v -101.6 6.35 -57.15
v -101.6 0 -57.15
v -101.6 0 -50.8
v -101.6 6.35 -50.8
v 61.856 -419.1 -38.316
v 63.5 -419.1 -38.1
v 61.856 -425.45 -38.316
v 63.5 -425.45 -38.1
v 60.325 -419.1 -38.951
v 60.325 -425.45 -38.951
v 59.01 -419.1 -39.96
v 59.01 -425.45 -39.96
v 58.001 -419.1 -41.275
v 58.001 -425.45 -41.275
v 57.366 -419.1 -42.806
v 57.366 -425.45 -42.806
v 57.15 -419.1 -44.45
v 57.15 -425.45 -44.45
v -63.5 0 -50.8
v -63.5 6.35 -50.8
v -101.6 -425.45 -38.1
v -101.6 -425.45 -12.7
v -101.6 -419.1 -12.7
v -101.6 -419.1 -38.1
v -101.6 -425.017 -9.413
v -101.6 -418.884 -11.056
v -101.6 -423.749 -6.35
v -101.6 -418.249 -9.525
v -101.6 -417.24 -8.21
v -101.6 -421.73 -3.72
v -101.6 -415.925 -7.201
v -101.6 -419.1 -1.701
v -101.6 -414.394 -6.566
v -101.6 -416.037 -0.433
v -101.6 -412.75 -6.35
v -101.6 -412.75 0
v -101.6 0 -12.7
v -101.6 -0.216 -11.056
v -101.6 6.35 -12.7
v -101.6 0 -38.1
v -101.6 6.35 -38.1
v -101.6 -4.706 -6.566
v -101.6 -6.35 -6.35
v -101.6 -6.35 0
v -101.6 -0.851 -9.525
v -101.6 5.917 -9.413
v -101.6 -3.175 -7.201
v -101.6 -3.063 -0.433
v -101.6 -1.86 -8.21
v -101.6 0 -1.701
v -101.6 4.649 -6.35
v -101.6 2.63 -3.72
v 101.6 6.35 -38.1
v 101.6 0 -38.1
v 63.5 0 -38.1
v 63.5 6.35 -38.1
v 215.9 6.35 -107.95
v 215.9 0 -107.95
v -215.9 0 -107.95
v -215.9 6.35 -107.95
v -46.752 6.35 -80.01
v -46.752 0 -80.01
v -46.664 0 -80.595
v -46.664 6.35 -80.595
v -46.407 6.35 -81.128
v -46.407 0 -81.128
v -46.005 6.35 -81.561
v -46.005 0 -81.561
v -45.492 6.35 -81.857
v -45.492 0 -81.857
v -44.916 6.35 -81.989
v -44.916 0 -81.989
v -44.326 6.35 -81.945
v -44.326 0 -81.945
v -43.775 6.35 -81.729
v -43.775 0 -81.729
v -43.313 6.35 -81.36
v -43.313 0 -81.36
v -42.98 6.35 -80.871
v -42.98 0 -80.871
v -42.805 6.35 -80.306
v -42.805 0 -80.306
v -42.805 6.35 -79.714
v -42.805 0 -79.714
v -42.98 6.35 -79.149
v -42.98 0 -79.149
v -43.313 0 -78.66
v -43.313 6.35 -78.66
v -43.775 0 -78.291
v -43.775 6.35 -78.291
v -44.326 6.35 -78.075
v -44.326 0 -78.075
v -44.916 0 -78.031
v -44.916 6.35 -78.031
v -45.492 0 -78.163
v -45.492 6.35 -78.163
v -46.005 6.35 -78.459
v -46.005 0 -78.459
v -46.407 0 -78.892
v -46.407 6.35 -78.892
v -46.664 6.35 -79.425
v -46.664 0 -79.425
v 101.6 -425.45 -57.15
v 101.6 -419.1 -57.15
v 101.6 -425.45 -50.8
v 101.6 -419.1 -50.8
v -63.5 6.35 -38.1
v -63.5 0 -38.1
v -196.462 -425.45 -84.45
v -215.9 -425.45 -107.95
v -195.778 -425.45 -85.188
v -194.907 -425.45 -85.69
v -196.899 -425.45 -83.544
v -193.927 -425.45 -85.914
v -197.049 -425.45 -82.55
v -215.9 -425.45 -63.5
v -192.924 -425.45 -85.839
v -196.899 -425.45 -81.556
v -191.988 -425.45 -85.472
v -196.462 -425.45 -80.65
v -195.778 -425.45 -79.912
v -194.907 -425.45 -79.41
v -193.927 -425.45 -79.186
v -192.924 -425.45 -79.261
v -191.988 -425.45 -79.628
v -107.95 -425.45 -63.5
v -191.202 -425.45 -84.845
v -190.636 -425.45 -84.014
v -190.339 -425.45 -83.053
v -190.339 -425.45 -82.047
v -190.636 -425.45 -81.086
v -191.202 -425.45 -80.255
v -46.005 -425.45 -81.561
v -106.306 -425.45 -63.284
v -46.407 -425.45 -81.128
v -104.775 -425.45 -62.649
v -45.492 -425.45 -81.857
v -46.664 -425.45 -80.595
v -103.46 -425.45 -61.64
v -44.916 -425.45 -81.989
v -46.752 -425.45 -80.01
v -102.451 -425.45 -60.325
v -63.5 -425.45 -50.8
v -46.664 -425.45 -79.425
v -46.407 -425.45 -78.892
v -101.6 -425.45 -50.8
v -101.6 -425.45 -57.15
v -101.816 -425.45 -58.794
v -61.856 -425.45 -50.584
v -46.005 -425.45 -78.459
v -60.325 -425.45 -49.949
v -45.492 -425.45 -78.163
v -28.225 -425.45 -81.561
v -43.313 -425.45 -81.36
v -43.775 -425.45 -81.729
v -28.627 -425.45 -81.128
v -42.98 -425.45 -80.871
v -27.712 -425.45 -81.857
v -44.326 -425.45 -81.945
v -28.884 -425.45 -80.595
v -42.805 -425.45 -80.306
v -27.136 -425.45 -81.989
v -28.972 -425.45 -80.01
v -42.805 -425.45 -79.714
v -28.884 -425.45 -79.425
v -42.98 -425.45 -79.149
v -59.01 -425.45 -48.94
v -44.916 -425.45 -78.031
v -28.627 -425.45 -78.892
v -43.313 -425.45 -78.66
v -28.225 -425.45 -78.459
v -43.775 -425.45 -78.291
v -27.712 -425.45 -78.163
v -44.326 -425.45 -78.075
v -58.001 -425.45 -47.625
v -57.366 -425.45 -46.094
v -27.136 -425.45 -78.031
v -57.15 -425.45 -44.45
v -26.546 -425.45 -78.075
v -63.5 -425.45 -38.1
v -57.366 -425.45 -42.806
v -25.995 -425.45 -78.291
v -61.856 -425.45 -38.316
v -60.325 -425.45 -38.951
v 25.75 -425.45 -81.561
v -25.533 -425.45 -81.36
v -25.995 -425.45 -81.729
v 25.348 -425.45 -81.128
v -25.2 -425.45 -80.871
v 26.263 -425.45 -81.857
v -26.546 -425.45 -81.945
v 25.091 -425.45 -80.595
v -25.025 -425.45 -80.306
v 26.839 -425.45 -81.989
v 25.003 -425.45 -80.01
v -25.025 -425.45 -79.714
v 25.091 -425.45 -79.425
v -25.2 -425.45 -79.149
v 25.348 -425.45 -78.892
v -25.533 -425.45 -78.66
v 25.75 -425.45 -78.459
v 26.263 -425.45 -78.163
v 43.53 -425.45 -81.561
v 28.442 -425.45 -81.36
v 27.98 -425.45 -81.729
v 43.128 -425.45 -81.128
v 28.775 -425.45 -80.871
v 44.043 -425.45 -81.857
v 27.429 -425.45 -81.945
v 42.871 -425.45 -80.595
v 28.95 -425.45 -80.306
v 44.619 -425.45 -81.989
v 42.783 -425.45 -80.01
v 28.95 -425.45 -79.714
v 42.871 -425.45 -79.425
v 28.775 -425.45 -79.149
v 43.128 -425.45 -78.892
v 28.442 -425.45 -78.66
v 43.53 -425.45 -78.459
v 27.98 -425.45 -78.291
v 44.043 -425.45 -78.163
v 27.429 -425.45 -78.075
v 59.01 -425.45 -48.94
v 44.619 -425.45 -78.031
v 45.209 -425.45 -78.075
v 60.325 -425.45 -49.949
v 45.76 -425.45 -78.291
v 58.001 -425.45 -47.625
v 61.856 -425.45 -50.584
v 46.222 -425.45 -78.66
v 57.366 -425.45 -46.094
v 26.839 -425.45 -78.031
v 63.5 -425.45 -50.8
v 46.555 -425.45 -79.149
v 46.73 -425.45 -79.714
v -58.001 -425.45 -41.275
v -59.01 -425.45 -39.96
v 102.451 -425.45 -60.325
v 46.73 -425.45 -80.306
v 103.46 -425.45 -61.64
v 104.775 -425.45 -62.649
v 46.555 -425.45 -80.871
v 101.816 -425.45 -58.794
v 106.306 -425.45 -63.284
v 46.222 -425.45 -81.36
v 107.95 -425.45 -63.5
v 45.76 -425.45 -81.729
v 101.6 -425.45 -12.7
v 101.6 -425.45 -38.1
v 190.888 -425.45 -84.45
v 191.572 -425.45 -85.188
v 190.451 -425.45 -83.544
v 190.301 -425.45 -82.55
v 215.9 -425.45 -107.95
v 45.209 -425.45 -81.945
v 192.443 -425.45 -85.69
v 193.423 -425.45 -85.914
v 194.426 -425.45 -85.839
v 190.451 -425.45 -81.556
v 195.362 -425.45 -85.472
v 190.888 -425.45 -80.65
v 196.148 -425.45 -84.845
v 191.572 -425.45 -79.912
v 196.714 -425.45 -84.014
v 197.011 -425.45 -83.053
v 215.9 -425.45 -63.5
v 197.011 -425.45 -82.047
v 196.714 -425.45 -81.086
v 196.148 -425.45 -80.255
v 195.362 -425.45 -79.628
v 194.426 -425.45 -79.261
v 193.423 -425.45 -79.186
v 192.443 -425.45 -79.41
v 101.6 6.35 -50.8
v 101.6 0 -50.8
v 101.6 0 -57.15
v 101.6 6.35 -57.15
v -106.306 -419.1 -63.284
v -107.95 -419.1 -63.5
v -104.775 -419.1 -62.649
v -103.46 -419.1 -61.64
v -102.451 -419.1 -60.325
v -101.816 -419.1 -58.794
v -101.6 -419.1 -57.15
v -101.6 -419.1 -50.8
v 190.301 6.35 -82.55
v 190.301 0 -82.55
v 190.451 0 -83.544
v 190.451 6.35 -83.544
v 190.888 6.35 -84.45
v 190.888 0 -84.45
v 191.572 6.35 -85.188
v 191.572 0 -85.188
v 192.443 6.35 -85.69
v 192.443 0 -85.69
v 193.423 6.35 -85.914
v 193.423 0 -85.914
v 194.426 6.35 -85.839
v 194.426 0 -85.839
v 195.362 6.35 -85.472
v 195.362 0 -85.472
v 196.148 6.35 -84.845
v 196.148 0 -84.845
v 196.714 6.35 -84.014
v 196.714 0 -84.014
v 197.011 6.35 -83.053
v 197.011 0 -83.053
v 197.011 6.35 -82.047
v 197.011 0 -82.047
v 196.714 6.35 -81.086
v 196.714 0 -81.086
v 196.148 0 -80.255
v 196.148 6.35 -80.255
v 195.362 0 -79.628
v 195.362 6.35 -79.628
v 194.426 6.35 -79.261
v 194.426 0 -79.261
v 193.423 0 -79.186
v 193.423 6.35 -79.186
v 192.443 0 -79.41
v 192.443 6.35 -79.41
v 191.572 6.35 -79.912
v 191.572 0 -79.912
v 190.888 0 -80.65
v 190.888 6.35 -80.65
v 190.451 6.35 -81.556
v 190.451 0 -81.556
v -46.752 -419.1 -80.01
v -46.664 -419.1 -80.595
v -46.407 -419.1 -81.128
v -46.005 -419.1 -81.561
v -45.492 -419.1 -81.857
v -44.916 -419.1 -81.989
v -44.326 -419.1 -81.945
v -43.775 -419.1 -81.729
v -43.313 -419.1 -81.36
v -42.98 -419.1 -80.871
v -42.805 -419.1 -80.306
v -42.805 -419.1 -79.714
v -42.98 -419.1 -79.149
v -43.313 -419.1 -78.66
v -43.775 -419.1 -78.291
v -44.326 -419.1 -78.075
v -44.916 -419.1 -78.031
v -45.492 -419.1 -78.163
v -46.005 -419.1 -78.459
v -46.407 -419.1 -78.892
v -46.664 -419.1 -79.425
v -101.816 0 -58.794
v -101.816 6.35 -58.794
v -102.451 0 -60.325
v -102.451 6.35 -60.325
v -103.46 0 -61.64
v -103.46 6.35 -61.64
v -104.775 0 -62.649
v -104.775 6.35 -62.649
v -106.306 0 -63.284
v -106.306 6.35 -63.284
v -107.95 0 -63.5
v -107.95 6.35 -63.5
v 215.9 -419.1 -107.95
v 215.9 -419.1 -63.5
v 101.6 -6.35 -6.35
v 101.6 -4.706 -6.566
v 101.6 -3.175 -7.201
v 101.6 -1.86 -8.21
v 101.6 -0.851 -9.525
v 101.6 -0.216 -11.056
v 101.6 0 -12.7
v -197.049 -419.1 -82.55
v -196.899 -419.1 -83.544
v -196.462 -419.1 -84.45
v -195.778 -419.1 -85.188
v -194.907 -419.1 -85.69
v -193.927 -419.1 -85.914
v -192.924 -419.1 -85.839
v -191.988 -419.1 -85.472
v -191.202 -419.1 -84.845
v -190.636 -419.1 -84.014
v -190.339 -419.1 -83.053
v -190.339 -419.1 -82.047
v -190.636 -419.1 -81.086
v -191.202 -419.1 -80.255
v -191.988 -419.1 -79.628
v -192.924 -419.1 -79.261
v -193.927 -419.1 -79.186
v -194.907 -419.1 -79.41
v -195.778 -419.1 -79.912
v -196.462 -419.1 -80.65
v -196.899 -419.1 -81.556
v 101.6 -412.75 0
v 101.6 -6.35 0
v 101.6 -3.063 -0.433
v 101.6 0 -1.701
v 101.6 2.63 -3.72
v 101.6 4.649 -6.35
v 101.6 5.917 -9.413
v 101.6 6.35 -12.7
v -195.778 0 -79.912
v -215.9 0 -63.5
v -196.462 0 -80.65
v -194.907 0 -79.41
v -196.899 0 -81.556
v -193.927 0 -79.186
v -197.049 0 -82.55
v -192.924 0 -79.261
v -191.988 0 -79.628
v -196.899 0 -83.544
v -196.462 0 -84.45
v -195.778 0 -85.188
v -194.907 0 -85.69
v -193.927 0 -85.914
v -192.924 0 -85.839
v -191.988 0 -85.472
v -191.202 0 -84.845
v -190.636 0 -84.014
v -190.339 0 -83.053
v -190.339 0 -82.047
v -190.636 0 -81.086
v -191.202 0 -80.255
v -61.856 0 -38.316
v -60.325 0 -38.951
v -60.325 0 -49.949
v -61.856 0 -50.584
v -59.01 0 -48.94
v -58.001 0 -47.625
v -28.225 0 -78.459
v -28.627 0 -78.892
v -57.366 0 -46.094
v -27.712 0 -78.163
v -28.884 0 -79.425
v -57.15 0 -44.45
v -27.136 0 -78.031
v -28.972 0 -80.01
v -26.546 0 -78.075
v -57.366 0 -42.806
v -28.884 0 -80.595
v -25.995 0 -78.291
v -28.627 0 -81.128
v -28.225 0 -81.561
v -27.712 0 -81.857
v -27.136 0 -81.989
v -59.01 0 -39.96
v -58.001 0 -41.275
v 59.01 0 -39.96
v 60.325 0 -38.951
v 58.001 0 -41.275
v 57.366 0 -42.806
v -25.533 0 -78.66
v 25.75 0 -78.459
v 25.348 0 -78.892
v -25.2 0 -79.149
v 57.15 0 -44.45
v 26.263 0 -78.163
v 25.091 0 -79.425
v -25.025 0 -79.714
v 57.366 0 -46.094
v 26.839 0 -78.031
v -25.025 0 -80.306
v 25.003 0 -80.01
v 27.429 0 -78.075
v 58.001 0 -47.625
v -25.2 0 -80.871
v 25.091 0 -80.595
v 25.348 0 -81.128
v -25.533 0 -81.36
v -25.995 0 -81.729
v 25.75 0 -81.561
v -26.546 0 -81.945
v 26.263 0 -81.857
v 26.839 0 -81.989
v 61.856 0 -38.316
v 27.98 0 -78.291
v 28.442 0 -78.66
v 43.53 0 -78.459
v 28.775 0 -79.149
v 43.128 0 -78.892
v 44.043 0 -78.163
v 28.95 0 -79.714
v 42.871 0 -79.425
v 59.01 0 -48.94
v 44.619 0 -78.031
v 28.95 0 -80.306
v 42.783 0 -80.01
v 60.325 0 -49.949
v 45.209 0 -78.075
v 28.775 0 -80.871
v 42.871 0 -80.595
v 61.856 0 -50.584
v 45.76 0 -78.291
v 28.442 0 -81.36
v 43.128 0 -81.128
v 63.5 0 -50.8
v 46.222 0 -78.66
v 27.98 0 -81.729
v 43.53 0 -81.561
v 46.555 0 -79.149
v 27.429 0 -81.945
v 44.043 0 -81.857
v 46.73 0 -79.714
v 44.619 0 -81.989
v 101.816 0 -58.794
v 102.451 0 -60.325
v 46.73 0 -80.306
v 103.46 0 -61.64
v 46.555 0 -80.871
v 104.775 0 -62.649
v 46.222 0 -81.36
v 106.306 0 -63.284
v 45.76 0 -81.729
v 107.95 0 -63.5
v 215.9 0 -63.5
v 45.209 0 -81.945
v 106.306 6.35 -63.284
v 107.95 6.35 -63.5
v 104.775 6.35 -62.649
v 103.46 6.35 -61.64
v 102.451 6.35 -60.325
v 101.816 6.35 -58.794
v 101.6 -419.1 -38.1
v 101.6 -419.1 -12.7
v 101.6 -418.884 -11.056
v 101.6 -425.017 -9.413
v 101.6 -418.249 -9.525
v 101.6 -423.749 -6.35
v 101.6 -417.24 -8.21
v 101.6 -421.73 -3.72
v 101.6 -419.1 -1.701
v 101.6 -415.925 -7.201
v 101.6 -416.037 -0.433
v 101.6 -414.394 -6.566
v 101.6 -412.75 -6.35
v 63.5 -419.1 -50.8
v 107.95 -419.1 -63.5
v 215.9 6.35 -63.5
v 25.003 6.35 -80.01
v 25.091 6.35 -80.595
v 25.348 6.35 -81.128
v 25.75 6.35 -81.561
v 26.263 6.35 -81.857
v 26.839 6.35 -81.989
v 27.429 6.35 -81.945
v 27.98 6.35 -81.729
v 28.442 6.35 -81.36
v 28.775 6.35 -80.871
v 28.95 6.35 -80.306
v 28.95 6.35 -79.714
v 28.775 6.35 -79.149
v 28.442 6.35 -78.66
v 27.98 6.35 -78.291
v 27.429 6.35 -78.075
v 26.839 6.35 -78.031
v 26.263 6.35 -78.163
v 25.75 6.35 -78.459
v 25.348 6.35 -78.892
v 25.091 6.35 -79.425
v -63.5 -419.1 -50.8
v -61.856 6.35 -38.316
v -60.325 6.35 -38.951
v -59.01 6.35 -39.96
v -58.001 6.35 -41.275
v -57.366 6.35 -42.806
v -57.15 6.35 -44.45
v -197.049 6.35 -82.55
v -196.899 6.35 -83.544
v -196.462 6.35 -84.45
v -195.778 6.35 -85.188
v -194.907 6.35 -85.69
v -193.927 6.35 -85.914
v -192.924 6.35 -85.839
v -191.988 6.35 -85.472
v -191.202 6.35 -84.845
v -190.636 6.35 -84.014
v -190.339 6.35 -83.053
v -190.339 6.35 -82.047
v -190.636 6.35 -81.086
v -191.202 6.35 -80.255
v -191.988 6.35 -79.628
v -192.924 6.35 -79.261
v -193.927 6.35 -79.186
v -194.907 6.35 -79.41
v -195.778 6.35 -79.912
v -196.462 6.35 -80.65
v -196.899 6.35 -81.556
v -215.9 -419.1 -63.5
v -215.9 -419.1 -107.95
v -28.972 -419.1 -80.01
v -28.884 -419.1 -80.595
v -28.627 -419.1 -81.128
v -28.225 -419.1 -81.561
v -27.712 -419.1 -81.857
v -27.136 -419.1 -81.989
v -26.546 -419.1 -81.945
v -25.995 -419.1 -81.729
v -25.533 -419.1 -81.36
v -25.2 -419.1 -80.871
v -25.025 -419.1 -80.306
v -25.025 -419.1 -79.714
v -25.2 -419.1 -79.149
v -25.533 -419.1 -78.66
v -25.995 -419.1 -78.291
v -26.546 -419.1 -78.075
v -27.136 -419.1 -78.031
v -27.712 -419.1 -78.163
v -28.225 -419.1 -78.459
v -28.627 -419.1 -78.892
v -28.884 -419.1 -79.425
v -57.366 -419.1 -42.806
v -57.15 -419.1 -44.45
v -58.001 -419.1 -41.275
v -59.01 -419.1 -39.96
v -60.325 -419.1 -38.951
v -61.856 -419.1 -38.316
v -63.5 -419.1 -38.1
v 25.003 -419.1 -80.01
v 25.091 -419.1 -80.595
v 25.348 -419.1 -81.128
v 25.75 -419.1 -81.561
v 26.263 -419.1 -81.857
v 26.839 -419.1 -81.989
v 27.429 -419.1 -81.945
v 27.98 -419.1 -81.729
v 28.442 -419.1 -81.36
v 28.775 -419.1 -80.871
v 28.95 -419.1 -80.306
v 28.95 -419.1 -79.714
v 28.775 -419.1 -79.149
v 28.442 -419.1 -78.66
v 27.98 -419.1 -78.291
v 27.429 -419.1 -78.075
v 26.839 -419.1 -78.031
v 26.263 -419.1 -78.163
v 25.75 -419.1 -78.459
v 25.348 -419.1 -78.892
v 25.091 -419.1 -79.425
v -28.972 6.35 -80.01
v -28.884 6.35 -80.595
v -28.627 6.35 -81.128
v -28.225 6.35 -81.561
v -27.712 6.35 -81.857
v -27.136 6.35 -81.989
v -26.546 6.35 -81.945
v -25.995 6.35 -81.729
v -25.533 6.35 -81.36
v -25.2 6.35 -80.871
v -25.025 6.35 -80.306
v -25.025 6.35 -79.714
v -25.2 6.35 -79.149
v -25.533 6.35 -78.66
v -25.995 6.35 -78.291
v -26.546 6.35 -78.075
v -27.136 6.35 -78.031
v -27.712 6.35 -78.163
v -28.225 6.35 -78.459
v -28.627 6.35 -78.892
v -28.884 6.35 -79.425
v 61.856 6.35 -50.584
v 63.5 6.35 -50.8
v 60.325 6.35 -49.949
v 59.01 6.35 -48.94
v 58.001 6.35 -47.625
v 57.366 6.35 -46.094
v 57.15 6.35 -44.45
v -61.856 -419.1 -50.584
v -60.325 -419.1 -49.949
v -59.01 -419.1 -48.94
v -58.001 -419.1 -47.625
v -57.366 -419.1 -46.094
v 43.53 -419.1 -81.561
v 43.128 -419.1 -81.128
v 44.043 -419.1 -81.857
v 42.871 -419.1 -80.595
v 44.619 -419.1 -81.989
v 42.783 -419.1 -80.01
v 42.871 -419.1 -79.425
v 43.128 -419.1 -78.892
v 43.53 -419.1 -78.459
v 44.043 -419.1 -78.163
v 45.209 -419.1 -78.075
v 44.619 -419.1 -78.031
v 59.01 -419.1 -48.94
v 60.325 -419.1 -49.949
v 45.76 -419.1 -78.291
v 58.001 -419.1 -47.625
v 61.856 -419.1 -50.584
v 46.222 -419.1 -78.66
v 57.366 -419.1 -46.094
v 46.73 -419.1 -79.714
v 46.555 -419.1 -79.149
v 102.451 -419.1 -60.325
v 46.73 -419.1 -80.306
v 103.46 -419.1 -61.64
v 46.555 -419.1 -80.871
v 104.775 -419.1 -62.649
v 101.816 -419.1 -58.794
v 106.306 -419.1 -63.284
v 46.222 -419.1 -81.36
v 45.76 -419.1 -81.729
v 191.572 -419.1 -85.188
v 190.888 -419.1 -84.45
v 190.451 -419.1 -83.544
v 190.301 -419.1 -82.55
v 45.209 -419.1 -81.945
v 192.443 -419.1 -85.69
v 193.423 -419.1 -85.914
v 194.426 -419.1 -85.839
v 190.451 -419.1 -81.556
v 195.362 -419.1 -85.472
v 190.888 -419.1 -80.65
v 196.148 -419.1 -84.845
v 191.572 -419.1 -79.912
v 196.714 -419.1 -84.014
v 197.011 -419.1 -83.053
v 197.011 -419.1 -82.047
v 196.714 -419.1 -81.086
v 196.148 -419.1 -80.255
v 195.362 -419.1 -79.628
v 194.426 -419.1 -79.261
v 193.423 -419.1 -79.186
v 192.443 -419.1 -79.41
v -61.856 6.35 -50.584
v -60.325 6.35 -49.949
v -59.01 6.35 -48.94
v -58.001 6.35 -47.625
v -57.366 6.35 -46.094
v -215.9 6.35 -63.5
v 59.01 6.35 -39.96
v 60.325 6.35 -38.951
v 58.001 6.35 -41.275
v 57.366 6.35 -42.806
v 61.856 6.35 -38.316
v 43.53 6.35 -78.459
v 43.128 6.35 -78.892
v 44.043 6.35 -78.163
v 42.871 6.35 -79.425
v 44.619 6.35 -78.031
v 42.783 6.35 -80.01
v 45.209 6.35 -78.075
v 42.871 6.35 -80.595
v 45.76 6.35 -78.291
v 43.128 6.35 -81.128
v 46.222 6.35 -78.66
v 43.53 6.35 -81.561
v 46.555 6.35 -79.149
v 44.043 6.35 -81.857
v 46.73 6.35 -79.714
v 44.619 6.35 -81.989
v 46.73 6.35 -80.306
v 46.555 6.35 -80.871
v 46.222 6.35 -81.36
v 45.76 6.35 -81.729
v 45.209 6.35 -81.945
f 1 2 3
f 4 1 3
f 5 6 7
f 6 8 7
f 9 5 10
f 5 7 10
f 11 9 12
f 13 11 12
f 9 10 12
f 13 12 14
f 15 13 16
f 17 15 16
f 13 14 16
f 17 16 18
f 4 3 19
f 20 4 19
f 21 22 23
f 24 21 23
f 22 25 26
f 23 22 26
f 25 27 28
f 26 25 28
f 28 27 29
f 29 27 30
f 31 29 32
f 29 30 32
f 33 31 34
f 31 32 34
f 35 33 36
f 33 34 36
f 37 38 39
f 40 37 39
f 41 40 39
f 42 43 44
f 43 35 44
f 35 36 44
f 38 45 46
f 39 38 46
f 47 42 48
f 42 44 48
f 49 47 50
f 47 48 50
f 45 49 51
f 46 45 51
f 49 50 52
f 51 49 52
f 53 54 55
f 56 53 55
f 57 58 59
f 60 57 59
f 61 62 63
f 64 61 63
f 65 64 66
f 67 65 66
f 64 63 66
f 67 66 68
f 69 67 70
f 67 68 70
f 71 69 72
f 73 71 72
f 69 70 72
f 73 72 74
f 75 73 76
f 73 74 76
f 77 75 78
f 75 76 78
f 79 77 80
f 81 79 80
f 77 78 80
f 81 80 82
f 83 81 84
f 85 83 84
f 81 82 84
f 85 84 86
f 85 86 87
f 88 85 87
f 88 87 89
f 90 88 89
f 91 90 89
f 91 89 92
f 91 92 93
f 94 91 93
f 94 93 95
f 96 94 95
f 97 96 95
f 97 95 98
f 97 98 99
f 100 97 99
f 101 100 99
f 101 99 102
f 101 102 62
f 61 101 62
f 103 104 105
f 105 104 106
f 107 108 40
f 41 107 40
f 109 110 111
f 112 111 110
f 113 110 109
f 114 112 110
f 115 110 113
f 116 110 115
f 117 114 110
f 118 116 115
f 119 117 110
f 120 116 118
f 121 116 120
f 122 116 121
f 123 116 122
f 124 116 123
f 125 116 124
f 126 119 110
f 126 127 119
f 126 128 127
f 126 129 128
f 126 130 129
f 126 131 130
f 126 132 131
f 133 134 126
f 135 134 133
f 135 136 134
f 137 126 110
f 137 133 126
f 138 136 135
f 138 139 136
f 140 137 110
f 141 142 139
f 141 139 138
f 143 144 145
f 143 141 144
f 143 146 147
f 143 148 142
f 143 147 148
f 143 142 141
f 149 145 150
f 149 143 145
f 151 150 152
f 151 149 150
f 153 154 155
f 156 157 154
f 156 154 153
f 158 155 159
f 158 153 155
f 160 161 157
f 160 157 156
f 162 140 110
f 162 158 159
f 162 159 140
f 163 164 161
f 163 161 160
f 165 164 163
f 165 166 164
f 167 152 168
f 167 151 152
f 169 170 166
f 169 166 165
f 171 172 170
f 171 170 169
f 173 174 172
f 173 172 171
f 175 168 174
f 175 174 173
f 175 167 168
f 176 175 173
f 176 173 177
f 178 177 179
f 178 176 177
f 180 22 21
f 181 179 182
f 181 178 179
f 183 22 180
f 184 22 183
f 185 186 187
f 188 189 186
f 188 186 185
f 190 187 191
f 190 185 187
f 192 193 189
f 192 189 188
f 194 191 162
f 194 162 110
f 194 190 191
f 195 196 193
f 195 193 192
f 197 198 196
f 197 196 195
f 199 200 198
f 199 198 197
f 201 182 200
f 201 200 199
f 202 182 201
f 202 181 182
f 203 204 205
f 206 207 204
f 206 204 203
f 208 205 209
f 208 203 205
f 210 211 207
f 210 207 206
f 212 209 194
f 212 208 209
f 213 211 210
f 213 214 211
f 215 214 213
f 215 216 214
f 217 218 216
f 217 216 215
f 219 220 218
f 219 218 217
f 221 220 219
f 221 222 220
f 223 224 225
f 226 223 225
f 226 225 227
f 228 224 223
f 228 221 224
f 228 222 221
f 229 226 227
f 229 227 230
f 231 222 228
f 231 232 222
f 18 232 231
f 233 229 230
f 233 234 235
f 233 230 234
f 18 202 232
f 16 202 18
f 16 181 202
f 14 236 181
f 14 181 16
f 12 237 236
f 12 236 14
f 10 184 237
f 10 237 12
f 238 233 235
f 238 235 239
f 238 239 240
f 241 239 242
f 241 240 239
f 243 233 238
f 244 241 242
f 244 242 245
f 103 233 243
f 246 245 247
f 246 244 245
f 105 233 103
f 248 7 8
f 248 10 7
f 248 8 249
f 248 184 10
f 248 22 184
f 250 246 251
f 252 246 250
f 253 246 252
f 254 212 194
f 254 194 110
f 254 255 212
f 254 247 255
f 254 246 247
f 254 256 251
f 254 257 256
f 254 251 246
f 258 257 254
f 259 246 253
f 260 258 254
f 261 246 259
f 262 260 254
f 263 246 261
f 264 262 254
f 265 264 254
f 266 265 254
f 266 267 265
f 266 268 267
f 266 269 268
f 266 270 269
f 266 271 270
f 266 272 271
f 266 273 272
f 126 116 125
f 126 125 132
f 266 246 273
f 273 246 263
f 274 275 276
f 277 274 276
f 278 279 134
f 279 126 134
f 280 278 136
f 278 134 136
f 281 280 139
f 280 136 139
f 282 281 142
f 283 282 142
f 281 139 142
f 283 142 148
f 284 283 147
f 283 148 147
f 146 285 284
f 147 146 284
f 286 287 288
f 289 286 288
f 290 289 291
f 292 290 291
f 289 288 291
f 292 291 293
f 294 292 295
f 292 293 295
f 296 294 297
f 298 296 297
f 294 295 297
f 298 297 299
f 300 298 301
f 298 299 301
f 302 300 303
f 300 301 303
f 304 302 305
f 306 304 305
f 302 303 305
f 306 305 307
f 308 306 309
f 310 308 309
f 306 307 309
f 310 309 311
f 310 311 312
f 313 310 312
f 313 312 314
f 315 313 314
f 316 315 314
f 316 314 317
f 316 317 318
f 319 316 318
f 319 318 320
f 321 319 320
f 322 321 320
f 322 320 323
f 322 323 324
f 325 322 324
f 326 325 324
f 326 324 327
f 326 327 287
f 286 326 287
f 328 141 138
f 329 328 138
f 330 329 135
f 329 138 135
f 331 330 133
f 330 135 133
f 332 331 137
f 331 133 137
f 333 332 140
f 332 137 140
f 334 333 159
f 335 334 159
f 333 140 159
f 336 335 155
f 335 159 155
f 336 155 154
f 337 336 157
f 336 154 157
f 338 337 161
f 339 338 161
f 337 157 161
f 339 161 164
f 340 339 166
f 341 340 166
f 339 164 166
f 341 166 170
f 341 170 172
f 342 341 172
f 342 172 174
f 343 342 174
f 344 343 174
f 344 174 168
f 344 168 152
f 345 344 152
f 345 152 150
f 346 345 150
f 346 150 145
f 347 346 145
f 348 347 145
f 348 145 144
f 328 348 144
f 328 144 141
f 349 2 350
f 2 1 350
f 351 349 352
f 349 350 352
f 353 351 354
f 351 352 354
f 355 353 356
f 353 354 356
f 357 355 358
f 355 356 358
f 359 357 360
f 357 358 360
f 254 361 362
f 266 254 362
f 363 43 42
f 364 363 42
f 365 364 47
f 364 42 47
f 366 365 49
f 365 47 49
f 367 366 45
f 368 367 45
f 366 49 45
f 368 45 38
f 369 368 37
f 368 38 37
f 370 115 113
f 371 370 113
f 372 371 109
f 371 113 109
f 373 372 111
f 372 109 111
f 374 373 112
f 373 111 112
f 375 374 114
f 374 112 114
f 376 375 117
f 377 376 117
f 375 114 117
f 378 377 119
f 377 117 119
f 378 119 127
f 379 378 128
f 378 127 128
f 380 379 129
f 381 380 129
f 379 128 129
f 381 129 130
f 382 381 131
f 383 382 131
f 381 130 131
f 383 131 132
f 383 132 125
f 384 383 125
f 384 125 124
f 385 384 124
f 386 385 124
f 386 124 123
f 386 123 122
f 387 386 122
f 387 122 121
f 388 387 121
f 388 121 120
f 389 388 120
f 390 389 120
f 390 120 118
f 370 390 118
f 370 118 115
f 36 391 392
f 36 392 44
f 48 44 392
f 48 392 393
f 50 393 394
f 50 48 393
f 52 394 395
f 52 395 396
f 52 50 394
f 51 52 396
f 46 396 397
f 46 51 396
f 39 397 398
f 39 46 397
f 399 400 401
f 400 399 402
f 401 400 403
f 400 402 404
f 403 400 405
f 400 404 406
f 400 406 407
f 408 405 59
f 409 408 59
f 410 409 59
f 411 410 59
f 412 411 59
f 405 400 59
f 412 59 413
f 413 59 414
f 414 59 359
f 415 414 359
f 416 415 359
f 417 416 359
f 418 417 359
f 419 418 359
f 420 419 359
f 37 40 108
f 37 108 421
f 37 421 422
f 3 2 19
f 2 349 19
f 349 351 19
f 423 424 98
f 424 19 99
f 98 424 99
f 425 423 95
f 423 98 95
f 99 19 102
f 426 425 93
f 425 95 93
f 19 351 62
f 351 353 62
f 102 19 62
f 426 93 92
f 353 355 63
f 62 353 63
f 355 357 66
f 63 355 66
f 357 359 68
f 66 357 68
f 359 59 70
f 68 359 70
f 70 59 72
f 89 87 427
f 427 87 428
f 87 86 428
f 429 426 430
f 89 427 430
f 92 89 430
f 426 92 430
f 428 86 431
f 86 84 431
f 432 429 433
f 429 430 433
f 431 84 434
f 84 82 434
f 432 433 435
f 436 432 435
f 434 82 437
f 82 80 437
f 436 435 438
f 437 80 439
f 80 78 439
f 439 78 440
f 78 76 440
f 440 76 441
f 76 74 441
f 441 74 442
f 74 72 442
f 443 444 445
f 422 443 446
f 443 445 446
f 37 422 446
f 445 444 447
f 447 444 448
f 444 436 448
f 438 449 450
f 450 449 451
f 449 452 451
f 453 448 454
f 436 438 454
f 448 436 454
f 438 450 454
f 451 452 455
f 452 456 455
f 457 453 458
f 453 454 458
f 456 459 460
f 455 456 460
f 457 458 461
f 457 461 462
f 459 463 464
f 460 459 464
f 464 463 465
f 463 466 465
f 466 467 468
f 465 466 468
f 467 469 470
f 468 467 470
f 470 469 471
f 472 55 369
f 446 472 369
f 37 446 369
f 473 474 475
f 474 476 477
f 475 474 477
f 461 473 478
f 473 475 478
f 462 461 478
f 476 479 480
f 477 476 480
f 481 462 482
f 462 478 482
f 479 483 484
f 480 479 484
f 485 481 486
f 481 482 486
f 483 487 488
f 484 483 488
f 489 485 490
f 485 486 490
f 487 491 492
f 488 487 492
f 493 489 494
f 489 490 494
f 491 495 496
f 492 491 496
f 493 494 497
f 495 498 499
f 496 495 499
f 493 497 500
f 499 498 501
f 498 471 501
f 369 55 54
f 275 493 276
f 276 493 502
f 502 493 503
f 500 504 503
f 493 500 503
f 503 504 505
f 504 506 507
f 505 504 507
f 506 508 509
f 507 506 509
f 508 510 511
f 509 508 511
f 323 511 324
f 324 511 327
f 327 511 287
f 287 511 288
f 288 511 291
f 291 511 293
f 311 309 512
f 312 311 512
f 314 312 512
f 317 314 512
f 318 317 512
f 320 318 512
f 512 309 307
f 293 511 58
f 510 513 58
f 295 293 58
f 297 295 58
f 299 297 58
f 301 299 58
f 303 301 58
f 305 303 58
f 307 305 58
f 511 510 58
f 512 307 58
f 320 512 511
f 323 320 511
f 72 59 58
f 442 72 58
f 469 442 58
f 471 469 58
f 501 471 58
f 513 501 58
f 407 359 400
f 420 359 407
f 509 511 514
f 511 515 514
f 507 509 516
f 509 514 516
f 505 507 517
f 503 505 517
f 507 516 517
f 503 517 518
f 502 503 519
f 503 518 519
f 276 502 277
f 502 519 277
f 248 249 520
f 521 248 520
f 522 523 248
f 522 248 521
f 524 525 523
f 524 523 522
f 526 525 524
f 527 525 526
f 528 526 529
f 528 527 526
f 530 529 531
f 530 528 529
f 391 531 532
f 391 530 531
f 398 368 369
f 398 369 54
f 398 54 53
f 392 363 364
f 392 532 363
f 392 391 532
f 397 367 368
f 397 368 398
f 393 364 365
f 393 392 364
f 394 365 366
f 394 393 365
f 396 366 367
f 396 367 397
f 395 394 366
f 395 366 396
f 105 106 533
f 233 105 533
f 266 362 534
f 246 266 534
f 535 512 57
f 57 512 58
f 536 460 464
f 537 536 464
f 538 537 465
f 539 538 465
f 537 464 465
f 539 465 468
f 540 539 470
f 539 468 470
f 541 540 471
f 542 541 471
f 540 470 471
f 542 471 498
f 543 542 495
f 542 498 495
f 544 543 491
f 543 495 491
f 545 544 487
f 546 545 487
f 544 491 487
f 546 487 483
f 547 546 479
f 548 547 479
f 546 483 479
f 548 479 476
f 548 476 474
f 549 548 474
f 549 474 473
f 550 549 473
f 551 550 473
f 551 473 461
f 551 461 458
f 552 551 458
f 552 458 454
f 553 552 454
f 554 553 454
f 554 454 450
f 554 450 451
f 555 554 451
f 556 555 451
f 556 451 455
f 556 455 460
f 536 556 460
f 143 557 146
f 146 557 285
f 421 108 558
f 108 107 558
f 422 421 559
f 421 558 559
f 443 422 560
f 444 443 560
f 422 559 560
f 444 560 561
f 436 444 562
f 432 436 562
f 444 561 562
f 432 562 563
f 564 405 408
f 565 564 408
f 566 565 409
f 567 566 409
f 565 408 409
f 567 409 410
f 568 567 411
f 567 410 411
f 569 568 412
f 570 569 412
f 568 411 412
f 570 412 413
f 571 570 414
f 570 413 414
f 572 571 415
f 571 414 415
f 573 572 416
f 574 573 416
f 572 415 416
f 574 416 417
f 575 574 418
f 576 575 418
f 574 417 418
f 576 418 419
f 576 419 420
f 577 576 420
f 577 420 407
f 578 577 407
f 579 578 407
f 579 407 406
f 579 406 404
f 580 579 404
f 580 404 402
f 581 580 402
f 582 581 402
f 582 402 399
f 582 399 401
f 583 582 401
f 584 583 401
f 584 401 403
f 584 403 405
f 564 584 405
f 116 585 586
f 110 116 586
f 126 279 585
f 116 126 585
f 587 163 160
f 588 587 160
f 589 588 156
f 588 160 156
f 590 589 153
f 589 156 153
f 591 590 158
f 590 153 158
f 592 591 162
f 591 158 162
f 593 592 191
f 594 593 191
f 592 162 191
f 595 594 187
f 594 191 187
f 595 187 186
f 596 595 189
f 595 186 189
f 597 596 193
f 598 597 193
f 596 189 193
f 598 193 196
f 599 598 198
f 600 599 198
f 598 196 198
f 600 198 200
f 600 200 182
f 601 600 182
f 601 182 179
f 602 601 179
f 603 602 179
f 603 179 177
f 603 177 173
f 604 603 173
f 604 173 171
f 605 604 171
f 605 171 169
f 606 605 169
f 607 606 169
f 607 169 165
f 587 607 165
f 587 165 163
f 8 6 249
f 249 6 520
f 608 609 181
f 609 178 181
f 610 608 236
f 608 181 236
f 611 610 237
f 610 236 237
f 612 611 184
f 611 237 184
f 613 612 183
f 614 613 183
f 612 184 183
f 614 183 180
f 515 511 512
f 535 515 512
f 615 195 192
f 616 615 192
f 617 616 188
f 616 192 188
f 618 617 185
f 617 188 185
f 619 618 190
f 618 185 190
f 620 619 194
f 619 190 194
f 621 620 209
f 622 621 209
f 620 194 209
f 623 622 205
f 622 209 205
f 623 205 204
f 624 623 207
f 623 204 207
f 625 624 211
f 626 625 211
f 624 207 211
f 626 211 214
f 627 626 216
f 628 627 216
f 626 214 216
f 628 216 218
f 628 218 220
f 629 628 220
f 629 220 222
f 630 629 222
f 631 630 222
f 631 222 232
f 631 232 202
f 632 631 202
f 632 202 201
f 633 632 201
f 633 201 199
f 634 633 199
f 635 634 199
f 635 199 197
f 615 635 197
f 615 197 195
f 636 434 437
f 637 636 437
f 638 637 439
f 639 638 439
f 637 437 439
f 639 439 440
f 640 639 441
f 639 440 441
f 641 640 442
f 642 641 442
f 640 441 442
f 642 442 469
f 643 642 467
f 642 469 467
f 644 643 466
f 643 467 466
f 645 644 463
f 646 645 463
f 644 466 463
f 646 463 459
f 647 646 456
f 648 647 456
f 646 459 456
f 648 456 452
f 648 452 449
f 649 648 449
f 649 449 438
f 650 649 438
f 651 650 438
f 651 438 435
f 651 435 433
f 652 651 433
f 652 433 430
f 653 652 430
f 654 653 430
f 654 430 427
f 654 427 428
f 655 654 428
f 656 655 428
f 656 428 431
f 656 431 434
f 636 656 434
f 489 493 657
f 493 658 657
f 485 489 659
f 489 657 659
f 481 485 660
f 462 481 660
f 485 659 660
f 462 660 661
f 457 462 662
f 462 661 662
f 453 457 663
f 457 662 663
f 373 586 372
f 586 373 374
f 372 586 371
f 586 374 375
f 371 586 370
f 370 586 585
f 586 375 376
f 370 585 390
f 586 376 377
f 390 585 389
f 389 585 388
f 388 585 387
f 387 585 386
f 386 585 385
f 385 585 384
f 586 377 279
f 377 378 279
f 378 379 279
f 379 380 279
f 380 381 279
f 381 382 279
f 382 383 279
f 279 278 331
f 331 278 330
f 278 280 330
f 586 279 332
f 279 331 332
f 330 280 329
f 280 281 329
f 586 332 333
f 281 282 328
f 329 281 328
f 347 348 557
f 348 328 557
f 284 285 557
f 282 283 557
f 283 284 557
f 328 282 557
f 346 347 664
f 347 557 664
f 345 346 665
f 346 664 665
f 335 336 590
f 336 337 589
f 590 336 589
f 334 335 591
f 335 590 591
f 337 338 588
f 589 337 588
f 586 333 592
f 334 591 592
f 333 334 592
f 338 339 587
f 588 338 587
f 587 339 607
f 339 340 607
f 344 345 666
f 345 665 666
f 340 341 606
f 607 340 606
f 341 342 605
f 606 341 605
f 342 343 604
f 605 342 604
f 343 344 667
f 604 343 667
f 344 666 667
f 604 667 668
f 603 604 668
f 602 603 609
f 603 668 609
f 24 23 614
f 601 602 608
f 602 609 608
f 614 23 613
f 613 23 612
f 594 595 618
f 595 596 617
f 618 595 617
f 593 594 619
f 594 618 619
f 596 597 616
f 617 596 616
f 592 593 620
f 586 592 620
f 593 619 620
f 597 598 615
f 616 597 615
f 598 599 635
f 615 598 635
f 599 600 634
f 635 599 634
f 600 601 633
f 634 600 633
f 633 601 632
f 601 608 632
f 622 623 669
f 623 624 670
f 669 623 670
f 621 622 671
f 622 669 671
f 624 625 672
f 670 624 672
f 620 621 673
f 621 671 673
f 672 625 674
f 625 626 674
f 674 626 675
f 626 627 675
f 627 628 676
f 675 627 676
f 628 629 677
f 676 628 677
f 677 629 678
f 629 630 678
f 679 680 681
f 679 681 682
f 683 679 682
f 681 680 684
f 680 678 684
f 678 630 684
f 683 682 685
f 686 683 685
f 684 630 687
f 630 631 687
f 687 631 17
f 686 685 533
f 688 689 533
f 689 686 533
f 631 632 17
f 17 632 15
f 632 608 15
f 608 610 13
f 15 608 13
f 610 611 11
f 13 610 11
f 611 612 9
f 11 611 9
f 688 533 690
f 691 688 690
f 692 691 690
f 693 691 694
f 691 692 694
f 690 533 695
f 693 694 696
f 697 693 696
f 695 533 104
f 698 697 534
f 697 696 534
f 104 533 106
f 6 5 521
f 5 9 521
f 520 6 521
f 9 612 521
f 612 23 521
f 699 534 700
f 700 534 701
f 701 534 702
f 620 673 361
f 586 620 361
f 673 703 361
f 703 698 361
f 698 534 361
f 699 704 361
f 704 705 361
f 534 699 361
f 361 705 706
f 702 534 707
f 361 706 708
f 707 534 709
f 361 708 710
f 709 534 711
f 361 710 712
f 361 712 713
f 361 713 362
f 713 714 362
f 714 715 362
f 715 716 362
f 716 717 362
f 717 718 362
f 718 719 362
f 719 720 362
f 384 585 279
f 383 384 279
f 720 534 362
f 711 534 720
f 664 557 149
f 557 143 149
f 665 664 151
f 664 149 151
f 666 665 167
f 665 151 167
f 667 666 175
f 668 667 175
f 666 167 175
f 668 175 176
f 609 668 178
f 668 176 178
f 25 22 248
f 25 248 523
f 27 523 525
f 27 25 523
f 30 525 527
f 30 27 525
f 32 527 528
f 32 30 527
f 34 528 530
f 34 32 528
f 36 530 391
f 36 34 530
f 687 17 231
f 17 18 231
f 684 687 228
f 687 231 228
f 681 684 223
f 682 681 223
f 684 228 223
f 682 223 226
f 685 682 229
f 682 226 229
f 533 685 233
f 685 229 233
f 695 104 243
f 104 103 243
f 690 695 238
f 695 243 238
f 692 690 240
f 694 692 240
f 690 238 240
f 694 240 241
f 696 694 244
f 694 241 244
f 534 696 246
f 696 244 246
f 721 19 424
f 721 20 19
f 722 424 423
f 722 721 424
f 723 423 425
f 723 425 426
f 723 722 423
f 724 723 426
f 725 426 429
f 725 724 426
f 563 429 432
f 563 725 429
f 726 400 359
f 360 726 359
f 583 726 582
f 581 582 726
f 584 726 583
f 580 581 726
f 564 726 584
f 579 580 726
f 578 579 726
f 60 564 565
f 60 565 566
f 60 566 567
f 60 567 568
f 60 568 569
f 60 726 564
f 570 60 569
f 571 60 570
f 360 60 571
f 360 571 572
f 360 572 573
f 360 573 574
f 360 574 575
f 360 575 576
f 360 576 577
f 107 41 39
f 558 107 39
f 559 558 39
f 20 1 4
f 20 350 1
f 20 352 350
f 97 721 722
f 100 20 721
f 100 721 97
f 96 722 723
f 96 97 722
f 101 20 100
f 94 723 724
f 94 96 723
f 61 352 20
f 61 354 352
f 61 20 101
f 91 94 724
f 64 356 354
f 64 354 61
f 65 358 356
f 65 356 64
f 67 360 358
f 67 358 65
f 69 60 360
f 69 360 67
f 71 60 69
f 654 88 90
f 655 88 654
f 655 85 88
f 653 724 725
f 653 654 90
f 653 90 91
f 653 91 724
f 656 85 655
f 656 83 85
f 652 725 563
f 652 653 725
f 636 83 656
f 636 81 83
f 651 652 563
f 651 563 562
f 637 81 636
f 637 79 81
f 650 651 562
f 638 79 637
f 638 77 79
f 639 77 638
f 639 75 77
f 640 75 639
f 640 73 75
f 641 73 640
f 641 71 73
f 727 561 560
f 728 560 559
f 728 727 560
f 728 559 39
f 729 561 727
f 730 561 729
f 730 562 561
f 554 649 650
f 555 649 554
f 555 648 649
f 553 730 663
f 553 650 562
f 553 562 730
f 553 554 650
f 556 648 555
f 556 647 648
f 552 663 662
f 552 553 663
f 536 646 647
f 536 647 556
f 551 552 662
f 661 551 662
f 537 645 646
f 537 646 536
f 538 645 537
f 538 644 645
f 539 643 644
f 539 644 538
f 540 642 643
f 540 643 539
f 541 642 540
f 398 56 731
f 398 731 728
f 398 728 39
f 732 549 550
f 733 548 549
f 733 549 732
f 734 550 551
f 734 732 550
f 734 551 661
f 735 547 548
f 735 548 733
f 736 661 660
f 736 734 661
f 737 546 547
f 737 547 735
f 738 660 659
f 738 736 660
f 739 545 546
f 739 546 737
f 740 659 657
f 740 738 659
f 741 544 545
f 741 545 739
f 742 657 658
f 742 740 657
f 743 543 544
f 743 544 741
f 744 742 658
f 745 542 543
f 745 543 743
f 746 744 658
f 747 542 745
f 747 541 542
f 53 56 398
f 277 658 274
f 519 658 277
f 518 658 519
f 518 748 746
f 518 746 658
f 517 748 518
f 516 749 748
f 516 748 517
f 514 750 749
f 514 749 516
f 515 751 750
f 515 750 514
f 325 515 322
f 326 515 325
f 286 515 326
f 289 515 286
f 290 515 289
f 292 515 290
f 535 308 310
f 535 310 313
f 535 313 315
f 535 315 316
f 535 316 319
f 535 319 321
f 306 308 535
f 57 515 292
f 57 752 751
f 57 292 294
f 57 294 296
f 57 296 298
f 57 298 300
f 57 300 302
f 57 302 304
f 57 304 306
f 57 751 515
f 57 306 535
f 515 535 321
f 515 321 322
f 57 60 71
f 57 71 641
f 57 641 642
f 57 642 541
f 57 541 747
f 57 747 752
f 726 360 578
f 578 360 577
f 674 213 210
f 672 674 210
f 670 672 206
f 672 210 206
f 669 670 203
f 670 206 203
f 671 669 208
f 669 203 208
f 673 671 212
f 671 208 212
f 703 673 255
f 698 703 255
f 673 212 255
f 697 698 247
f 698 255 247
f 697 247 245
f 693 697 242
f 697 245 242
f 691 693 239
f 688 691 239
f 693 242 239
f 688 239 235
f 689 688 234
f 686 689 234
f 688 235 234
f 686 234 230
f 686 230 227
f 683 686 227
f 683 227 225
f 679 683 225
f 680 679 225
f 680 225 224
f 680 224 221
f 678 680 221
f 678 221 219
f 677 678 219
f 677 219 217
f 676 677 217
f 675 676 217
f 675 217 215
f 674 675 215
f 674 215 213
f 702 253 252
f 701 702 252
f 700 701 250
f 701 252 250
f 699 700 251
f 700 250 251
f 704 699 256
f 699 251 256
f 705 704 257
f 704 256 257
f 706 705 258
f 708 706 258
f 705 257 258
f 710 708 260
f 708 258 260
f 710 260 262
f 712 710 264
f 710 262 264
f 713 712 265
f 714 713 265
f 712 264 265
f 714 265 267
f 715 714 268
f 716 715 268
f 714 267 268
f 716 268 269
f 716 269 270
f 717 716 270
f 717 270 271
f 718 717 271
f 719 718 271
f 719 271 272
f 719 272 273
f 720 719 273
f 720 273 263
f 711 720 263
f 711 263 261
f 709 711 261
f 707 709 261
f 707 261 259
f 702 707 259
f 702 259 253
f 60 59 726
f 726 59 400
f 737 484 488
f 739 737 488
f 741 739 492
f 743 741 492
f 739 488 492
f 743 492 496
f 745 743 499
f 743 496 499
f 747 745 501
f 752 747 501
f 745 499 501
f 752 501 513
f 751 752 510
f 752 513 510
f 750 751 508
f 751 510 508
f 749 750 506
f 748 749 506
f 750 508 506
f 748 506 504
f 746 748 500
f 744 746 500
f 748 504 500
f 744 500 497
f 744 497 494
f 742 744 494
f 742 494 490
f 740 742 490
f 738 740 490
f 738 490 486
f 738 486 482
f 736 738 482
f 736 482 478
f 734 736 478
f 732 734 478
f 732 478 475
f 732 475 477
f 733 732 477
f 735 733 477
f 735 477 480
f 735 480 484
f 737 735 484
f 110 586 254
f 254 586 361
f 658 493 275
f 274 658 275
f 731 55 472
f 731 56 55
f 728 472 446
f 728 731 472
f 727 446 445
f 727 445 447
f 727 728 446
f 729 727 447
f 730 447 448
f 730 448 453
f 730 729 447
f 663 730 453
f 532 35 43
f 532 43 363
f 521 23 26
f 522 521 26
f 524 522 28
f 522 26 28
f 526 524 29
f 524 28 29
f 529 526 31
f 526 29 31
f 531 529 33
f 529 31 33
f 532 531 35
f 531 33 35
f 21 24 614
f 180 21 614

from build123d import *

# Parameters (mm, degrees)
BOSS_EXTRUDE1_DEPTH              = 6.35
SKETCH2_W                        = 203.2
SKETCH2_H                        = 6.35
BOSS_EXTRUDE2_DEPTH              = 419.1
BOSS_EXTRUDE3_DEPTH              = 6.35
F_17_64_0_26563_DIAMETER_HOLE1_D = 6.747002
F_5_32_0_15625_DIAMETER_HOLE1_D  = 3.96875
FILLET1_R                        = 6.35
CONVERT_SOLID1_START             = -101.6
CONVERT_SOLID1_DEPTH             = 203.2
CONVERT_SOLID1_2_DEPTH           = 203.2
FILLET2_R                        = 6.35


# Read off the part's stored shape, not the designer's step: Convert-Solid1
with BuildPart() as part:
    # Sketch1 → Boss-Extrude1 (new body)
    with BuildSketch(Plane(origin=(0, 0, 0), x_dir=(1, 0, 0), z_dir=(0, 1, 0))):
        Polygon((-215.9, 107.95), (-215.9, 63.5), (-101.6, 63.5), (-101.6, 50.8), (-57.15, 50.8), (-57.15, 38.1), (-101.6, 38.1), (-101.6, 0), (101.6, 0), (101.6, 38.1), (57.15, 38.1), (57.15, 50.8), (101.6, 50.8), (101.6, 63.5), (215.9, 63.5), (215.9, 107.95), align=None)
    extrude(amount=BOSS_EXTRUDE1_DEPTH)

    # Sketch2 → Boss-Extrude2 (add)
    with BuildSketch(Plane.XZ):
        with Locations((0, -3.175)):
            Rectangle(SKETCH2_W, SKETCH2_H)
    extrude(amount=BOSS_EXTRUDE2_DEPTH)

    # Sketch3 → Boss-Extrude3 (add)
    with BuildSketch(Plane.XZ.offset(419.1)):
        Polygon((-101.6, -50.8), (-101.6, -63.5), (-215.9, -63.5), (-215.9, -107.95), (215.9, -107.95), (215.9, -63.5), (101.6, -63.5), (101.6, -50.8), (57.15, -50.8), (57.15, -38.1), (101.6, -38.1), (101.6, 0), (-101.6, 0), (-101.6, -38.1), (-57.15, -38.1), (-57.15, -50.8), align=None)
    extrude(amount=BOSS_EXTRUDE3_DEPTH)

    # 17/64 (0.26563) Diameter Hole1 (through all)
    with Locations(Plane(origin=(0, 6.35, 0), x_dir=(1, 0, 0), z_dir=(0, 1, 0))):
        with Locations((-193.675, 82.55), (193.675, 82.55)):
            Hole(F_17_64_0_26563_DIAMETER_HOLE1_D / 2)

    # 5/32 (0.15625) Diameter Hole1 (through all)
    with Locations(Plane(origin=(0, 6.35, 0), x_dir=(1, 0, 0), z_dir=(0, 1, 0))):
        with Locations((-44.7675, 80.01), (-26.9875, 80.01), (26.9875, 80.01), (44.7675, 80.01)):
            Hole(F_5_32_0_15625_DIAMETER_HOLE1_D / 2)

    # Fillet1
    fillet1_edges = [part.edges().sort_by_distance(p)[0] for p in [
        (57.15, -422.275, -38.1),
        (57.15, -422.275, -50.8),
        (-57.15, -422.275, -38.1),
        (-57.15, -422.275, -50.8),
        (57.15, 3.175, -38.1),
        (57.15, 3.175, -50.8),
        (-57.15, 3.175, -38.1),
        (-57.15, 3.175, -50.8),
    ]]
    fillet(fillet1_edges, radius=FILLET1_R - 0.0001)  # a hair under: the kernel refuses the full size

    # Convert-Solid1 outline → Convert-Solid1 (cut)
    with BuildSketch(Plane.YZ.offset(CONVERT_SOLID1_START)):
        with BuildLine():
            Line((6.35, 0), (-6.35, 0))
            ThreePointArc((-6.35, 0), (2.630256121, -3.719743879), (6.35, -12.7))
            Line((6.35, -12.7), (6.35, 0))
        make_face()
        with BuildLine():
            ThreePointArc((-425.45, -12.7), (-421.730256121, -3.719743879), (-412.75, 0))
            Line((-412.75, 0), (-425.45, 0))
            Line((-425.45, 0), (-425.45, -12.7))
        make_face()
    extrude(amount=CONVERT_SOLID1_DEPTH, mode=Mode.SUBTRACT)

    # Convert-Solid1 2 outline → Convert-Solid1 2 (add)
    with BuildSketch(Plane.YZ.offset(CONVERT_SOLID1_START)):
        with BuildLine():
            Line((0, -6.35), (-6.35, -6.35))
            ThreePointArc((-6.35, -6.35), (-1.859871939, -8.209871939), (0, -12.7))
            Line((0, -12.7), (0, -6.35))
        make_face()
        with BuildLine():
            ThreePointArc((-419.1, -12.7), (-417.240128061, -8.209871939), (-412.75, -6.35))
            Line((-412.75, -6.35), (-419.1, -6.35))
            Line((-419.1, -6.35), (-419.1, -12.7))
        make_face()
    extrude(amount=CONVERT_SOLID1_2_DEPTH)

    # Fillet2
    fillet2_edges = [part.edges().sort_by_distance(p)[0] for p in [
        (101.6, 3.175, -63.5),
        (-101.6, 3.175, -63.5),
        (-101.6, -422.275, -63.5),
        (101.6, -422.275, -63.5),
    ]]
    fillet(fillet2_edges, radius=FILLET2_R)


solid = part.part
